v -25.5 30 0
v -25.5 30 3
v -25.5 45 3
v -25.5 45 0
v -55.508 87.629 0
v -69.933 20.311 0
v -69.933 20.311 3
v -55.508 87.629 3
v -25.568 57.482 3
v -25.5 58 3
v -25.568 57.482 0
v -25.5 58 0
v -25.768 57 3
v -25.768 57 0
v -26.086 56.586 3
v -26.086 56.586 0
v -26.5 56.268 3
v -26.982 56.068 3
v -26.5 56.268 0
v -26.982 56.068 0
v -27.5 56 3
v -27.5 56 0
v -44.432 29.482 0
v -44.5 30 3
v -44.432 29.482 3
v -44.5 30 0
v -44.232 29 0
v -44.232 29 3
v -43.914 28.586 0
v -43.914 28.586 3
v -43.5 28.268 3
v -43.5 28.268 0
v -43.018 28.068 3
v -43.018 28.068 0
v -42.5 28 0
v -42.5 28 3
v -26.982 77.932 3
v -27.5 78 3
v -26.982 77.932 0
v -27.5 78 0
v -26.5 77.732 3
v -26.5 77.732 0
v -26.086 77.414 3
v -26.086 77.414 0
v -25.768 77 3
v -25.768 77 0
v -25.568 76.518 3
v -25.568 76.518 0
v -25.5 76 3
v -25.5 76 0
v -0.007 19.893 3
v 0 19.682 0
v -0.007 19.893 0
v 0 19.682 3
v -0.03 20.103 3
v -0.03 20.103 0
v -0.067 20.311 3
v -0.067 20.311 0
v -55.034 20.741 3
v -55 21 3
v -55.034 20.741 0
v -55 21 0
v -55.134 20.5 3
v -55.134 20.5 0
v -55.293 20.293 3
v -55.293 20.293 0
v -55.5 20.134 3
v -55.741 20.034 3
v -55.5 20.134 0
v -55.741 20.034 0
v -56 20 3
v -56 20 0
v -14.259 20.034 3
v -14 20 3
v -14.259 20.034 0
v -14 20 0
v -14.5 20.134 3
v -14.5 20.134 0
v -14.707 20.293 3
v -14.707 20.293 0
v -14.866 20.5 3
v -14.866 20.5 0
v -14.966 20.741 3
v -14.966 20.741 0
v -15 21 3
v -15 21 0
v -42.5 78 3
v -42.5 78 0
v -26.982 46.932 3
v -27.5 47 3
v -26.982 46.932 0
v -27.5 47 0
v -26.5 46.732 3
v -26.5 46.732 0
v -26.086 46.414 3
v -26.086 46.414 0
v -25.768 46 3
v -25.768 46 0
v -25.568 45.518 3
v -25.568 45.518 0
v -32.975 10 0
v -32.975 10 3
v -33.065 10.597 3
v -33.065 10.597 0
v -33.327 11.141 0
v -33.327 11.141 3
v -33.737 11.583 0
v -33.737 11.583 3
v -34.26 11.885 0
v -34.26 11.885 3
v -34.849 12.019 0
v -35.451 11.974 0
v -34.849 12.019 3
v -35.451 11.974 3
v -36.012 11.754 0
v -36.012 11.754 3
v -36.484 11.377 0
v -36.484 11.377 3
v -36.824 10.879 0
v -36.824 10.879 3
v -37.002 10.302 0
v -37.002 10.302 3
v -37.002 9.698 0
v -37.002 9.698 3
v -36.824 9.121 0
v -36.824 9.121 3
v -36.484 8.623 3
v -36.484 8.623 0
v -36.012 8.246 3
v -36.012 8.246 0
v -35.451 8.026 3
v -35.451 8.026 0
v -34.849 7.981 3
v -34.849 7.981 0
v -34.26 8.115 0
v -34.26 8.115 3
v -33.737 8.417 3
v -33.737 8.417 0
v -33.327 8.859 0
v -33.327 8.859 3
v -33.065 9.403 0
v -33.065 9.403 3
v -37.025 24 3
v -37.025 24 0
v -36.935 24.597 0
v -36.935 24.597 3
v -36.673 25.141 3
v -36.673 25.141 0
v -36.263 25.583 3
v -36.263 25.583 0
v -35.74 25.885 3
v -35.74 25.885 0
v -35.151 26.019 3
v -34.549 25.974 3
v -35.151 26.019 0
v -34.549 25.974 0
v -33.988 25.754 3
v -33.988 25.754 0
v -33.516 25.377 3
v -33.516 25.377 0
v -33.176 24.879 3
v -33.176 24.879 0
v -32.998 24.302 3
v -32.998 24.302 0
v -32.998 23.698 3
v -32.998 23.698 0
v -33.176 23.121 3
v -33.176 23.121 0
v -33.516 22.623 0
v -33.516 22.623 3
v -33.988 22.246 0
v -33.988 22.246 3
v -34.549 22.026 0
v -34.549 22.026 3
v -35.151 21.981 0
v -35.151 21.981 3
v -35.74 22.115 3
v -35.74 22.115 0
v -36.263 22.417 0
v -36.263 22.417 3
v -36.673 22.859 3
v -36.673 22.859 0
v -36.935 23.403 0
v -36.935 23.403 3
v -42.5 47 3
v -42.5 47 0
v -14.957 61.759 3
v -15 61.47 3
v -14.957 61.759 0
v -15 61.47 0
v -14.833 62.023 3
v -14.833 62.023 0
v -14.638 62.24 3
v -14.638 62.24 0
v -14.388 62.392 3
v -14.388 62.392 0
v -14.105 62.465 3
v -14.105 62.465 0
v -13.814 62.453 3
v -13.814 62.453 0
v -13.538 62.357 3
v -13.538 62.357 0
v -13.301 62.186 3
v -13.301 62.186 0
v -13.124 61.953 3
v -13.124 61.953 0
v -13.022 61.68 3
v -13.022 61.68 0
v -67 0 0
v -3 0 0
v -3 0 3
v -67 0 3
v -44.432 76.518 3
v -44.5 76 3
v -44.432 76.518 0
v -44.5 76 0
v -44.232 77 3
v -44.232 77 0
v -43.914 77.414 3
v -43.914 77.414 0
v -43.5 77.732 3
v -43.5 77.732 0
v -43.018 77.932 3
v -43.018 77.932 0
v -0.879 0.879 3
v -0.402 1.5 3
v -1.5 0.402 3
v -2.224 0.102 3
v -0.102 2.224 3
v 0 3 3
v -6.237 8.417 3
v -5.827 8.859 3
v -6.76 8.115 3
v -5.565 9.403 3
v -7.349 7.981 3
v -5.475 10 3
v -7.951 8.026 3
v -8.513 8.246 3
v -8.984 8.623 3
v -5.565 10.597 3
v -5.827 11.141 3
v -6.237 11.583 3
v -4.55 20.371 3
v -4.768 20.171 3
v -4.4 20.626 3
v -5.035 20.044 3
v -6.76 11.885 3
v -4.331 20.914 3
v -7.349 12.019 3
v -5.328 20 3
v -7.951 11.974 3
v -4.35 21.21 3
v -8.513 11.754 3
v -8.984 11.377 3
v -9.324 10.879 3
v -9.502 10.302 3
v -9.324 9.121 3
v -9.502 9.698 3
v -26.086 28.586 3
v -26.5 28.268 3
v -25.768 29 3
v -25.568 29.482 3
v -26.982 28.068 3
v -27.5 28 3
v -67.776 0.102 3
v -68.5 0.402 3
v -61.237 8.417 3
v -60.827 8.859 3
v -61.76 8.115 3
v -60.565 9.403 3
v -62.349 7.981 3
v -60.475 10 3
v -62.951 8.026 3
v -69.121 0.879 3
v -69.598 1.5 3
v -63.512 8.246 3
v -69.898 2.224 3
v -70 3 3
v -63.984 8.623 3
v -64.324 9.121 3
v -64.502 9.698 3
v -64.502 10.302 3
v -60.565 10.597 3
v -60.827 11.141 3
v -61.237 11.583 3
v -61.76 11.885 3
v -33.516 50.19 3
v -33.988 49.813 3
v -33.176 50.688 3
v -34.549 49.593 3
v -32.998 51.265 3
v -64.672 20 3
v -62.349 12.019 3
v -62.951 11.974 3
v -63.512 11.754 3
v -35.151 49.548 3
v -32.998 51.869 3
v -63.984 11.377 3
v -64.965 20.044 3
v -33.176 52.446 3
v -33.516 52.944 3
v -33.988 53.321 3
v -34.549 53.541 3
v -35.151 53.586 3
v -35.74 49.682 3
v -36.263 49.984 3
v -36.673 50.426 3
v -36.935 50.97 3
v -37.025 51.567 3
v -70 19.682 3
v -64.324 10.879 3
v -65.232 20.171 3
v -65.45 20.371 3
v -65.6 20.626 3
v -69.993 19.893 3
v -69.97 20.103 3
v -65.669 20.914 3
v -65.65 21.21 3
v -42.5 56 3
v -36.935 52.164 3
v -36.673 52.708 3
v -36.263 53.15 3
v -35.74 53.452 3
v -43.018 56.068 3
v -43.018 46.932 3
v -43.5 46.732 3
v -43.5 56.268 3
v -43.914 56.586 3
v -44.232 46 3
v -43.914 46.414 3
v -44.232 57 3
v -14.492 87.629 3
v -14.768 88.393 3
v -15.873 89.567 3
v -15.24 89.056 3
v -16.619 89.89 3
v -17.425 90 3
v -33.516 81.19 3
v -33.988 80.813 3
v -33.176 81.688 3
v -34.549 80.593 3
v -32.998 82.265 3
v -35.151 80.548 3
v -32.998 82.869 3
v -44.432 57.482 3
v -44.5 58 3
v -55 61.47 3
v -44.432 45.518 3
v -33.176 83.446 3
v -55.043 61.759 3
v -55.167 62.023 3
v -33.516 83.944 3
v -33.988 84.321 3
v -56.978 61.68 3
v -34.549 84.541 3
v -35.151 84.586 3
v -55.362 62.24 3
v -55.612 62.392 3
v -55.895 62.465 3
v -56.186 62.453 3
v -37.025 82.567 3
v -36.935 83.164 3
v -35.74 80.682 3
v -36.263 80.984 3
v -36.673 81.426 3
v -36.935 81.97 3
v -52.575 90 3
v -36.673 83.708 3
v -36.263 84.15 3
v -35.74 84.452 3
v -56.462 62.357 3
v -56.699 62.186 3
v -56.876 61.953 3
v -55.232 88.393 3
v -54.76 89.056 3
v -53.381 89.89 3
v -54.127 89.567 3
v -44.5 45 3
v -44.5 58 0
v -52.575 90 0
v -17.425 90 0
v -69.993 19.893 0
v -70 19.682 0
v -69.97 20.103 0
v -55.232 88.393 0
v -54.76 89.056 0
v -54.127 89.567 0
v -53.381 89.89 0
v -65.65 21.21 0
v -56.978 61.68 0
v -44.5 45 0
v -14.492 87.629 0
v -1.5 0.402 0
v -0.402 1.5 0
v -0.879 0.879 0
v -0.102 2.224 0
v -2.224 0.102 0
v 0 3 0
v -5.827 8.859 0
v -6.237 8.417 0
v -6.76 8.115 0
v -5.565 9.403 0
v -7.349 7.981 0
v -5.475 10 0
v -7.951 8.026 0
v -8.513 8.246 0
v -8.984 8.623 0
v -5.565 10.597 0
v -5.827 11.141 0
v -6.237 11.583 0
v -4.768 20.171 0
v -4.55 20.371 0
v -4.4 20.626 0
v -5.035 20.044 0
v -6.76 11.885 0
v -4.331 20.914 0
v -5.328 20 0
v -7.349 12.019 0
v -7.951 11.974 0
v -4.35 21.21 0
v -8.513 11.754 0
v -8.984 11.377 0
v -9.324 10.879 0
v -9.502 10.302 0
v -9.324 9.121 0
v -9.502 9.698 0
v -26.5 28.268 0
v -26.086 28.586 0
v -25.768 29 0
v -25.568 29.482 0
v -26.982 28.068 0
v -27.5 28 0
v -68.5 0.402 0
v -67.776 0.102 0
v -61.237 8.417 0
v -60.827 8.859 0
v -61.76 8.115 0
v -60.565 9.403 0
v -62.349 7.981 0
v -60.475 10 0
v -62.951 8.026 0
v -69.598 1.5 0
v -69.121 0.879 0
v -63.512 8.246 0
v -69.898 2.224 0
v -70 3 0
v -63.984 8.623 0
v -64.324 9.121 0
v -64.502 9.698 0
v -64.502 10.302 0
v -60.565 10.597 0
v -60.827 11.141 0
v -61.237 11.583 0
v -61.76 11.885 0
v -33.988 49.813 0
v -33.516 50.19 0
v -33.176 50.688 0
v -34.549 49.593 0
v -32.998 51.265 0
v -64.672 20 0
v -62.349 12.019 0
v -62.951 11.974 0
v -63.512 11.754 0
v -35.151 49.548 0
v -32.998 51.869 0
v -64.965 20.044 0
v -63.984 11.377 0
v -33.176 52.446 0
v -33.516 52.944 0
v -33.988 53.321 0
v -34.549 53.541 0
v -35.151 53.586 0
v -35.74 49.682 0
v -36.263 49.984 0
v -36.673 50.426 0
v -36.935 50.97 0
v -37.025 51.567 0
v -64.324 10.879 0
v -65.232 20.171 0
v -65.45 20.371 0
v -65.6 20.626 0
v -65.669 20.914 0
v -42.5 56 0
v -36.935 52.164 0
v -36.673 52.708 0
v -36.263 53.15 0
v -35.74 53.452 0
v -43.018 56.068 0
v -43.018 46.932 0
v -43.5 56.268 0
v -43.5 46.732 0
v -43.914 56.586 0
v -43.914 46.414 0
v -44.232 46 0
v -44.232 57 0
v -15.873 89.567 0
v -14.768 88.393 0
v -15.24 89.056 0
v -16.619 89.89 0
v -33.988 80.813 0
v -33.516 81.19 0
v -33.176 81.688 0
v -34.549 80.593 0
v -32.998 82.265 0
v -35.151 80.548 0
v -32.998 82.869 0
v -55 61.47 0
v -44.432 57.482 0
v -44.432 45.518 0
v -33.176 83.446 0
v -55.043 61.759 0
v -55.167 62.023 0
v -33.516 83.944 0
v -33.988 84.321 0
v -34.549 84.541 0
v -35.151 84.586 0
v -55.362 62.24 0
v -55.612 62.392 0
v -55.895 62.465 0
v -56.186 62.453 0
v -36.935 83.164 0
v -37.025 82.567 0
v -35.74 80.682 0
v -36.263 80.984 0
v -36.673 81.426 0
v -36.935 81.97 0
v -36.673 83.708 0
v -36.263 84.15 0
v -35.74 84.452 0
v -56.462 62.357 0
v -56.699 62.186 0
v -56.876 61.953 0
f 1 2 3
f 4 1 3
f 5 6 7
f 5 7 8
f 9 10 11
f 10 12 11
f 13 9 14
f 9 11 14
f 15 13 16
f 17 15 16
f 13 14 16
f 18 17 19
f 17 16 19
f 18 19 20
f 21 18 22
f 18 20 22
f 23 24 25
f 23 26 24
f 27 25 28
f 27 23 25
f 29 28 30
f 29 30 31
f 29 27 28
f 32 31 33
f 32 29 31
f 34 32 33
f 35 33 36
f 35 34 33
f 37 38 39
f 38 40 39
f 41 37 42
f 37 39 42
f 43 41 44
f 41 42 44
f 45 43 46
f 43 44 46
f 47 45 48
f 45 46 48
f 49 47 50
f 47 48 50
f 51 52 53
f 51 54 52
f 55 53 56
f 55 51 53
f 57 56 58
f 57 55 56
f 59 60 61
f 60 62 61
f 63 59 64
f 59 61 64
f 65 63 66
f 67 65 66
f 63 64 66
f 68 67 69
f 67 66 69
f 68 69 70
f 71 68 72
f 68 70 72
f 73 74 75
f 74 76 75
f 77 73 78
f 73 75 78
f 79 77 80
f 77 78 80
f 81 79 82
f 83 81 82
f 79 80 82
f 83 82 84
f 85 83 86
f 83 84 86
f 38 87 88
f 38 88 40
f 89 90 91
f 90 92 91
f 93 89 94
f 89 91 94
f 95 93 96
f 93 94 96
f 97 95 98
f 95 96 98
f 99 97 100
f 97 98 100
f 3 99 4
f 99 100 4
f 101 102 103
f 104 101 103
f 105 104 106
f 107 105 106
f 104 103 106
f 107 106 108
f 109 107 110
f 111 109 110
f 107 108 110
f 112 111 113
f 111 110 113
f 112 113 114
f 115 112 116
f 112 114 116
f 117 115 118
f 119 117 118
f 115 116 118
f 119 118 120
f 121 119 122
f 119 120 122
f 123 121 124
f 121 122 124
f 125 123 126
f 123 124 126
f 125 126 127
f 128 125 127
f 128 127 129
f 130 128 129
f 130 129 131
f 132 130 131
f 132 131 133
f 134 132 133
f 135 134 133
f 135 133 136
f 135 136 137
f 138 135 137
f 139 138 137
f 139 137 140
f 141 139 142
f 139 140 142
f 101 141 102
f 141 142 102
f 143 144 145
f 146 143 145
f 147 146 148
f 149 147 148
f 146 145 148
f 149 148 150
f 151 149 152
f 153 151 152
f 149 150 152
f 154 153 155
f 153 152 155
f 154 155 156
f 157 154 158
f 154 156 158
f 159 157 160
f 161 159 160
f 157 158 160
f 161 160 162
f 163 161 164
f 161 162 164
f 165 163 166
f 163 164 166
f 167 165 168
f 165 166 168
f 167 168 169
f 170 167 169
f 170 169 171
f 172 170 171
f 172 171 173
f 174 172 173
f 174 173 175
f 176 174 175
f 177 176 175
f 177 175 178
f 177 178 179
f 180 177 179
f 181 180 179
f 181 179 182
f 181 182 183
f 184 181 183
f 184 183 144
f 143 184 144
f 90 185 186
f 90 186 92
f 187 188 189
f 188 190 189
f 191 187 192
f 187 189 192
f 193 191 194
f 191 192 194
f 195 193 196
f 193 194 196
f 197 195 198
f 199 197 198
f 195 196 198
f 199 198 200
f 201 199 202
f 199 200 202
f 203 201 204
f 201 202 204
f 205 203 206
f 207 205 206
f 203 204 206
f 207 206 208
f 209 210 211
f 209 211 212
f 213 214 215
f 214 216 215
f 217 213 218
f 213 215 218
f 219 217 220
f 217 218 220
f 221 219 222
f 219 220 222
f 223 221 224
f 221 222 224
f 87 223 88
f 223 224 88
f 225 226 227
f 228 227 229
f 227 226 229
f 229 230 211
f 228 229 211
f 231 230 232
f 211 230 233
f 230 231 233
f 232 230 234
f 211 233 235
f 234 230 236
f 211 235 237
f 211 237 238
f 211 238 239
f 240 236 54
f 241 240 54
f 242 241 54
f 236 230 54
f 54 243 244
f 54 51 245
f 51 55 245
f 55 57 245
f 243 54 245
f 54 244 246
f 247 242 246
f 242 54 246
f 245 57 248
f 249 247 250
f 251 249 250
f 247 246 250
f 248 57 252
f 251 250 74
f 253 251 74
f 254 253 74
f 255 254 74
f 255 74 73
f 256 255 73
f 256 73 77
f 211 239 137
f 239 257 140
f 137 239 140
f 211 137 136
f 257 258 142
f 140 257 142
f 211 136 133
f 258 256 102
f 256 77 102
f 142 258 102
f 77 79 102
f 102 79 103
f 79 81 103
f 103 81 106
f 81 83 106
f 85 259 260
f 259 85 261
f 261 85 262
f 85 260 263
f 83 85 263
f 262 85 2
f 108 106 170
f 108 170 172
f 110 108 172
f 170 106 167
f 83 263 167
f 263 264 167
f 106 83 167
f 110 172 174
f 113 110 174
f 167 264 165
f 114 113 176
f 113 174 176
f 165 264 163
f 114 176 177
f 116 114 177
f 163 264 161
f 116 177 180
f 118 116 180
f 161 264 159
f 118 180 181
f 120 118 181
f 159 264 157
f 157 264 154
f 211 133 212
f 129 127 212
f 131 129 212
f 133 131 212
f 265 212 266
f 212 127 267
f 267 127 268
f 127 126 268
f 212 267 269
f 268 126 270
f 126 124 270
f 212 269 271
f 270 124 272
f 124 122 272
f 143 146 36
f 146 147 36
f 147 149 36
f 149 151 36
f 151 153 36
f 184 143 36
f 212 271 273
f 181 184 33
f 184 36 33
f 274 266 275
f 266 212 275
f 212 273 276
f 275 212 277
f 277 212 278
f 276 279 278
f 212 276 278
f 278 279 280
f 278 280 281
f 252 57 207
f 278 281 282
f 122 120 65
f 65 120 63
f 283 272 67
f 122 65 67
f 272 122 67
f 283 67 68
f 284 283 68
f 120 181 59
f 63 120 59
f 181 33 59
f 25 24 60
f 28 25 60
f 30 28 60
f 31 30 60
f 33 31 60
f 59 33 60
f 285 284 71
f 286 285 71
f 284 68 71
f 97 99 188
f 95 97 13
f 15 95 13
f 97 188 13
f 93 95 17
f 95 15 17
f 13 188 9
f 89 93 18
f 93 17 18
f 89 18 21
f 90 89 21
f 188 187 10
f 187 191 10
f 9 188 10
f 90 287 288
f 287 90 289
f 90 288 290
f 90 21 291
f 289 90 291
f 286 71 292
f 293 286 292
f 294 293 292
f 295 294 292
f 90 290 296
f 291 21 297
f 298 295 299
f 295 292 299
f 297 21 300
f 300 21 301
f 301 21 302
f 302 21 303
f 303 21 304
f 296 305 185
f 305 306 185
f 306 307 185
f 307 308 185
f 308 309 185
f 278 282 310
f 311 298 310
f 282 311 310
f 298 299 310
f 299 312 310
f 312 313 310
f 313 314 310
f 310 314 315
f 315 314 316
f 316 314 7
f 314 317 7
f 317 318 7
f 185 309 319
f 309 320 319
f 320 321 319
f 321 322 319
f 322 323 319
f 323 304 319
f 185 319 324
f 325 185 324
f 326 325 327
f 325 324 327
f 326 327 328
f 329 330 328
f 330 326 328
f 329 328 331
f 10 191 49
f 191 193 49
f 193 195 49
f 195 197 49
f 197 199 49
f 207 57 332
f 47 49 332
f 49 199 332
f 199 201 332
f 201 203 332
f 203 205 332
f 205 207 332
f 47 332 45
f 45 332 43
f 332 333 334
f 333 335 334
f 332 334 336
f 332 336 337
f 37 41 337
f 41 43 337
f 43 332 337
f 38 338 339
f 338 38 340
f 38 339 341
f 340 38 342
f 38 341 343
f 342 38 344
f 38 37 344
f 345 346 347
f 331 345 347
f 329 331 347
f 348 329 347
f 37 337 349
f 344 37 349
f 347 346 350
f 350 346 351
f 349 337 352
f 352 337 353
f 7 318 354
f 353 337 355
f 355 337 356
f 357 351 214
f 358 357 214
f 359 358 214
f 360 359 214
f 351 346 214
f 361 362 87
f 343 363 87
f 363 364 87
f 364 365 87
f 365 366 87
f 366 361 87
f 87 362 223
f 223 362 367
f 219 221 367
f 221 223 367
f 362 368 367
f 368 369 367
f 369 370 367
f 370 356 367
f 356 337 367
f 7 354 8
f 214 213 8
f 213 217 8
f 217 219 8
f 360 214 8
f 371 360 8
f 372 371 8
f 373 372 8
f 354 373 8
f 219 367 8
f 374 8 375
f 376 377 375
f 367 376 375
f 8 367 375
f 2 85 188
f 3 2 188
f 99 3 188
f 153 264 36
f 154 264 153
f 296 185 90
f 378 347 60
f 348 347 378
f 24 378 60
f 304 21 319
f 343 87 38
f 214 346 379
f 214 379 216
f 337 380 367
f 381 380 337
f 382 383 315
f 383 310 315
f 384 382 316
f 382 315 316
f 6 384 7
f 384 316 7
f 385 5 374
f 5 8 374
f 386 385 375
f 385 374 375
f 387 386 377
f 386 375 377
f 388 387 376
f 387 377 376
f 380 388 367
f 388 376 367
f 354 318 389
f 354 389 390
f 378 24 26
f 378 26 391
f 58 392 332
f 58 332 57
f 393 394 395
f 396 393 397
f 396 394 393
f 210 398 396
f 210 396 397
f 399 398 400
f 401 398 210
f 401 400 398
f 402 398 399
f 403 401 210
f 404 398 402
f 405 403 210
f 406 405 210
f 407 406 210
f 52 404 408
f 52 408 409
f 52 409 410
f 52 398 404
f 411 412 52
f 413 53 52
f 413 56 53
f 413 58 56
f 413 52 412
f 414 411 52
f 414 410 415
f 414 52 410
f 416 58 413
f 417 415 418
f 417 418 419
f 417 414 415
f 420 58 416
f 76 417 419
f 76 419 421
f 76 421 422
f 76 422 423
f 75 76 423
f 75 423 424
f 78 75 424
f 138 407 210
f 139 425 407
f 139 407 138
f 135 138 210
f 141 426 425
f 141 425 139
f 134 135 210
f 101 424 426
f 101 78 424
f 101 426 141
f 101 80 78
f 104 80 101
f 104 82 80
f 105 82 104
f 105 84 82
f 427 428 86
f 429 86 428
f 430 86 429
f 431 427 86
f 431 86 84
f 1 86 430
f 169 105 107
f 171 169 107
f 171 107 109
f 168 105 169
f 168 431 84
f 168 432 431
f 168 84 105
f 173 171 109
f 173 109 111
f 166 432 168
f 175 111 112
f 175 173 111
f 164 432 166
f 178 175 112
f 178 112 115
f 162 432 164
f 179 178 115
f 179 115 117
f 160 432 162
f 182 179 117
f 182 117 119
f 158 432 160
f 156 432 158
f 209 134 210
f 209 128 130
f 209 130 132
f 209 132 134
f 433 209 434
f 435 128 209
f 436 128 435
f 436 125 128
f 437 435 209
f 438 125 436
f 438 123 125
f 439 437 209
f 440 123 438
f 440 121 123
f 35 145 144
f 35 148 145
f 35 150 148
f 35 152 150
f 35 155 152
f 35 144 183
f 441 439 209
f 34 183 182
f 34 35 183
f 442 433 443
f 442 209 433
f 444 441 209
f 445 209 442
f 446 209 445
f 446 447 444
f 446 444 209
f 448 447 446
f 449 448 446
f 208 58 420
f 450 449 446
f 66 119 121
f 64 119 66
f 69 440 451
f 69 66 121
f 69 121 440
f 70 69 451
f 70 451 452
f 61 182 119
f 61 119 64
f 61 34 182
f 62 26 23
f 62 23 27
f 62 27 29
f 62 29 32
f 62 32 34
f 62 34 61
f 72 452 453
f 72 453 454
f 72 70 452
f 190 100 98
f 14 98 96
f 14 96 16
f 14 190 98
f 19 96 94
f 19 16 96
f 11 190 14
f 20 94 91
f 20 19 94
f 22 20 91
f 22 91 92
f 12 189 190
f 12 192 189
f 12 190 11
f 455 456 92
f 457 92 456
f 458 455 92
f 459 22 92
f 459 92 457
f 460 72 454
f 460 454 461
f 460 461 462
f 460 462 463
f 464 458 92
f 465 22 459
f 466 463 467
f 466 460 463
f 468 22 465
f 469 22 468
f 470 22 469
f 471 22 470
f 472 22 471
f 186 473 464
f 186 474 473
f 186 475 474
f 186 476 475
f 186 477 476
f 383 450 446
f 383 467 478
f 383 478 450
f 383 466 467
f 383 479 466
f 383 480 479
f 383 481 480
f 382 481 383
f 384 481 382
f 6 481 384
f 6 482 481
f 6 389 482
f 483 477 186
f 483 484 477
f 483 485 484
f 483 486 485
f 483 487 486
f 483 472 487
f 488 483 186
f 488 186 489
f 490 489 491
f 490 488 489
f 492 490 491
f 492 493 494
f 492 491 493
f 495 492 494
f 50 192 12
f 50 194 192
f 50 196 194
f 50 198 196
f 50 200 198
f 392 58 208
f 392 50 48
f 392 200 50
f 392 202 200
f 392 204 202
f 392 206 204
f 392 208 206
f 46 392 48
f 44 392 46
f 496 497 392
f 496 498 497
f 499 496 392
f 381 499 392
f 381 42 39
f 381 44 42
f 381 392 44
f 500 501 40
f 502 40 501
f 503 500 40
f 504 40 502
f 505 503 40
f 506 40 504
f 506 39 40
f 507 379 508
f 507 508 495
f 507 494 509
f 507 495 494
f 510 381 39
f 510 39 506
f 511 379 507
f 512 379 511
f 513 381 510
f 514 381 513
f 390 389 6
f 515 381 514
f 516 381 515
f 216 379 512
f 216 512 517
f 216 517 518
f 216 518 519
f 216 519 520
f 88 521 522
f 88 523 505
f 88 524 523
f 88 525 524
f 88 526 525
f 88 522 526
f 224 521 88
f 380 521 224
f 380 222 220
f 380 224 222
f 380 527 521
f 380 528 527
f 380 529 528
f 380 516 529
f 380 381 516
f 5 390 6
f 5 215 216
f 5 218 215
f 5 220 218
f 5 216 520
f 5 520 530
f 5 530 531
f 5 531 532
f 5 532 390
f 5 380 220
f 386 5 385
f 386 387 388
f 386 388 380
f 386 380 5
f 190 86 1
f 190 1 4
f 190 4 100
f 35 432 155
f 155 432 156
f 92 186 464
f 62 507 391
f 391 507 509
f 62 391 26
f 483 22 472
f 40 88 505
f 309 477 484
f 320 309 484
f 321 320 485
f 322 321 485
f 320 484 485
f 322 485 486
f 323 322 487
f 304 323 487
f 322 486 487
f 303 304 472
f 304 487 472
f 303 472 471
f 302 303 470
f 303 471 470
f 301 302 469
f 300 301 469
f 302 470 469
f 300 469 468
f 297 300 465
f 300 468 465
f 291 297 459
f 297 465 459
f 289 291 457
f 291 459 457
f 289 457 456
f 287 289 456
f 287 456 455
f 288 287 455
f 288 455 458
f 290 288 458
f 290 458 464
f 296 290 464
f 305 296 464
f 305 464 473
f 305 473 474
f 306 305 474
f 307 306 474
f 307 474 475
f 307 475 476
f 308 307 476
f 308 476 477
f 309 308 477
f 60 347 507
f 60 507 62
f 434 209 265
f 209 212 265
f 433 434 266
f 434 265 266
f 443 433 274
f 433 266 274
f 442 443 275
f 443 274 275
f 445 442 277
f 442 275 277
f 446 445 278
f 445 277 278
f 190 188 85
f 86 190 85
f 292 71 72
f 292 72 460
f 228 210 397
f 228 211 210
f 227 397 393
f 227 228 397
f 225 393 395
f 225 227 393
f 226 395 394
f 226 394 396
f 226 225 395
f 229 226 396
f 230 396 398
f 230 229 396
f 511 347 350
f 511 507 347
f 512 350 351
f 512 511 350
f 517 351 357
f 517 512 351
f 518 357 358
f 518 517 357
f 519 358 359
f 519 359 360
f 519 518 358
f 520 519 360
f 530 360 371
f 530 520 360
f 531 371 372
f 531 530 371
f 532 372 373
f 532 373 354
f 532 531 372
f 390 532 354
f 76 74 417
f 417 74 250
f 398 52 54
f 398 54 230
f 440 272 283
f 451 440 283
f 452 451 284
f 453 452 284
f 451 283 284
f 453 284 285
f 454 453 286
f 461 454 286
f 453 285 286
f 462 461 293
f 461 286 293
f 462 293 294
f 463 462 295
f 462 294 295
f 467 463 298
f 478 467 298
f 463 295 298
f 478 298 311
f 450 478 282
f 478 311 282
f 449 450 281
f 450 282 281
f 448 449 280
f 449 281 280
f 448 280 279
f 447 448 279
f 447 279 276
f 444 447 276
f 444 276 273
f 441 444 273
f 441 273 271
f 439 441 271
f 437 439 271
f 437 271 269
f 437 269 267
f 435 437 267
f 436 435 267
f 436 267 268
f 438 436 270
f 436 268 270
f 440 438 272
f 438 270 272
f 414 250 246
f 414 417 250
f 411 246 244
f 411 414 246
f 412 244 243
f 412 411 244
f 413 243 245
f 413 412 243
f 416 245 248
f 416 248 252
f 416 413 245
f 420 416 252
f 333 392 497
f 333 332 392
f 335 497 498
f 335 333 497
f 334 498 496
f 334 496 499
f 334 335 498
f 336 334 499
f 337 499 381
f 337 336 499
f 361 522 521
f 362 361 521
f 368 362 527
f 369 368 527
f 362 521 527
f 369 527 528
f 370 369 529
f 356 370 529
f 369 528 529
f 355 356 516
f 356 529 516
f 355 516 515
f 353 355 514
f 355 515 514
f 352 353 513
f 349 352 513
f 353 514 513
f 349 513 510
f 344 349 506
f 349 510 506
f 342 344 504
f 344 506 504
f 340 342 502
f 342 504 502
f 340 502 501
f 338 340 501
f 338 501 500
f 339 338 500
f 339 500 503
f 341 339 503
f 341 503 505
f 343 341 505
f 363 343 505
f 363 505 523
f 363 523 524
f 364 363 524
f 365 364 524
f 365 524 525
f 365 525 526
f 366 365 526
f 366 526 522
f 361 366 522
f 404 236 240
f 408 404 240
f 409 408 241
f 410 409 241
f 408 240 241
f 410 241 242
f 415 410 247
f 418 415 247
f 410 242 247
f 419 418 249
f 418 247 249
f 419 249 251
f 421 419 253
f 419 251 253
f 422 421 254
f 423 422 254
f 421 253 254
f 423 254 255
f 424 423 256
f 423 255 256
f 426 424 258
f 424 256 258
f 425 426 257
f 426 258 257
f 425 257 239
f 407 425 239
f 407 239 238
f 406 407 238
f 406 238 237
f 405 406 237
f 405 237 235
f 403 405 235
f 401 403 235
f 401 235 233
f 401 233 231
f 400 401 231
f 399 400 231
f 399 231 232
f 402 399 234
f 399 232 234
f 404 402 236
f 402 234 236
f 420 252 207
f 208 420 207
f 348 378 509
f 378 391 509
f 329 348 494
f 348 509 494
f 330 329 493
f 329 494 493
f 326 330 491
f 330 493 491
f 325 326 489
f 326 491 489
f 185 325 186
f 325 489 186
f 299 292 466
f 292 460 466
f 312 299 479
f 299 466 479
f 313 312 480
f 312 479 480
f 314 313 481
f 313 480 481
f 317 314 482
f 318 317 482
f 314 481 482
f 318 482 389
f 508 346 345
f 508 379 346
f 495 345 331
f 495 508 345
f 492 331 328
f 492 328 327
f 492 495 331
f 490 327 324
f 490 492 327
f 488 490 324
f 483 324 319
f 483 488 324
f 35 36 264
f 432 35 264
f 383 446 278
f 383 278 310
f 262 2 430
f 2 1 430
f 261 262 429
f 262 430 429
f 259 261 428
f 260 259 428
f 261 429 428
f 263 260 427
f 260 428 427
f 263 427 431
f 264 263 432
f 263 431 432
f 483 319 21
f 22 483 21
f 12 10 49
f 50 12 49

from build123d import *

# Parameters (mm, degrees)
EXTRUDE_1_DEPTH     = 3
SKETCH_3_W          = 19
SKETCH_3_H          = 22
SKETCH_3_H_2        = 19
CUT_EXTRUDE_1_DEPTH = 3
FILLET_1_R          = 1
FILLET_2_R          = 2
FILLET_3_R          = 3
SKETCH_4_R          = 2.025
CUT_EXTRUDE_2_DEPTH = 3
SKETCH_5_R          = 2.025
CUT_EXTRUDE_3_DEPTH = 10


with BuildPart() as part:
    # 草图1 → 凸台-拉伸1 (new body)
    with BuildSketch(Plane.XY):
        Polygon((0, 0), (-70, 0), (-70, 20), (-55, 90), (-15, 90), (0, 20), align=None)
    extrude(amount=EXTRUDE_1_DEPTH)

    # 草图3 → 切除-拉伸1 (cut)
    with BuildSketch(Plane.XY.offset(3)):
        with Locations((-35, 67)):
            Rectangle(SKETCH_3_W, SKETCH_3_H)
        with Locations((-35, 37.5)):
            Rectangle(SKETCH_3_W, SKETCH_3_H_2)
        Polygon((-55, 70.909571916), (-55, 20), (-65.909193982, 20), align=None)
        Polygon((-4.090806018, 20), (-15, 70.909571916), (-15, 20), align=None)
    extrude(amount=-CUT_EXTRUDE_1_DEPTH, mode=Mode.SUBTRACT)

    # 圆角1
    fillet_1_edges = [part.edges().sort_by_distance(p)[0] for p in [
        (-4.090806018, 20, 1.5),
        (-15, 20, 1.5),
        (-15, 70.909571916, 1.5),
        (-65.909193982, 20, 1.5),
        (-55, 70.909571916, 1.5),
        (-55, 20, 1.5),
    ]]
    fillet(fillet_1_edges, radius=FILLET_1_R)

    # 圆角2
    fillet_2_edges = [part.edges().sort_by_distance(p)[0] for p in [
        (-25.5, 47, 1.5),
        (-25.5, 28, 1.5),
        (-44.5, 28, 1.5),
        (-44.5, 47, 1.5),
        (-25.5, 78, 1.5),
        (-25.5, 56, 1.5),
        (-44.5, 56, 1.5),
        (-44.5, 78, 1.5),
    ]]
    fillet(fillet_2_edges, radius=FILLET_2_R)

    # 圆角3
    fillet_3_edges = [part.edges().sort_by_distance(p)[0] for p in [
        (0, 0, 1.5),
        (-70, 0, 1.5),
        (-70, 20, 1.5),
        (-55, 90, 1.5),
        (-15, 90, 1.5),
        (0, 20, 1.5),
    ]]
    fillet(fillet_3_edges, radius=FILLET_3_R)

    # 草图4 → 切除-拉伸2 (cut)
    with BuildSketch(Plane.XY.offset(3)):
        with Locations((-62.5, 10)):
            Circle(SKETCH_4_R)
        with Locations((-35, 10)):
            Circle(SKETCH_4_R)
        with Locations((-7.5, 10)):
            Circle(SKETCH_4_R)
    extrude(amount=-CUT_EXTRUDE_2_DEPTH, mode=Mode.SUBTRACT)

    # 草图5 → 切除-拉伸3 (cut)
    with BuildSketch(Plane(origin=(0, 0, 0), x_dir=(-1, 0, 0), z_dir=(0, 0, -1))):
        with Locations((35, 82.566965626)):
            Circle(SKETCH_5_R)
        with Locations((35, 51.566965626)):
            Circle(SKETCH_5_R)
        with Locations((35, 24)):
            Circle(SKETCH_5_R)
    extrude(amount=-CUT_EXTRUDE_3_DEPTH, mode=Mode.SUBTRACT)


solid = part.part
